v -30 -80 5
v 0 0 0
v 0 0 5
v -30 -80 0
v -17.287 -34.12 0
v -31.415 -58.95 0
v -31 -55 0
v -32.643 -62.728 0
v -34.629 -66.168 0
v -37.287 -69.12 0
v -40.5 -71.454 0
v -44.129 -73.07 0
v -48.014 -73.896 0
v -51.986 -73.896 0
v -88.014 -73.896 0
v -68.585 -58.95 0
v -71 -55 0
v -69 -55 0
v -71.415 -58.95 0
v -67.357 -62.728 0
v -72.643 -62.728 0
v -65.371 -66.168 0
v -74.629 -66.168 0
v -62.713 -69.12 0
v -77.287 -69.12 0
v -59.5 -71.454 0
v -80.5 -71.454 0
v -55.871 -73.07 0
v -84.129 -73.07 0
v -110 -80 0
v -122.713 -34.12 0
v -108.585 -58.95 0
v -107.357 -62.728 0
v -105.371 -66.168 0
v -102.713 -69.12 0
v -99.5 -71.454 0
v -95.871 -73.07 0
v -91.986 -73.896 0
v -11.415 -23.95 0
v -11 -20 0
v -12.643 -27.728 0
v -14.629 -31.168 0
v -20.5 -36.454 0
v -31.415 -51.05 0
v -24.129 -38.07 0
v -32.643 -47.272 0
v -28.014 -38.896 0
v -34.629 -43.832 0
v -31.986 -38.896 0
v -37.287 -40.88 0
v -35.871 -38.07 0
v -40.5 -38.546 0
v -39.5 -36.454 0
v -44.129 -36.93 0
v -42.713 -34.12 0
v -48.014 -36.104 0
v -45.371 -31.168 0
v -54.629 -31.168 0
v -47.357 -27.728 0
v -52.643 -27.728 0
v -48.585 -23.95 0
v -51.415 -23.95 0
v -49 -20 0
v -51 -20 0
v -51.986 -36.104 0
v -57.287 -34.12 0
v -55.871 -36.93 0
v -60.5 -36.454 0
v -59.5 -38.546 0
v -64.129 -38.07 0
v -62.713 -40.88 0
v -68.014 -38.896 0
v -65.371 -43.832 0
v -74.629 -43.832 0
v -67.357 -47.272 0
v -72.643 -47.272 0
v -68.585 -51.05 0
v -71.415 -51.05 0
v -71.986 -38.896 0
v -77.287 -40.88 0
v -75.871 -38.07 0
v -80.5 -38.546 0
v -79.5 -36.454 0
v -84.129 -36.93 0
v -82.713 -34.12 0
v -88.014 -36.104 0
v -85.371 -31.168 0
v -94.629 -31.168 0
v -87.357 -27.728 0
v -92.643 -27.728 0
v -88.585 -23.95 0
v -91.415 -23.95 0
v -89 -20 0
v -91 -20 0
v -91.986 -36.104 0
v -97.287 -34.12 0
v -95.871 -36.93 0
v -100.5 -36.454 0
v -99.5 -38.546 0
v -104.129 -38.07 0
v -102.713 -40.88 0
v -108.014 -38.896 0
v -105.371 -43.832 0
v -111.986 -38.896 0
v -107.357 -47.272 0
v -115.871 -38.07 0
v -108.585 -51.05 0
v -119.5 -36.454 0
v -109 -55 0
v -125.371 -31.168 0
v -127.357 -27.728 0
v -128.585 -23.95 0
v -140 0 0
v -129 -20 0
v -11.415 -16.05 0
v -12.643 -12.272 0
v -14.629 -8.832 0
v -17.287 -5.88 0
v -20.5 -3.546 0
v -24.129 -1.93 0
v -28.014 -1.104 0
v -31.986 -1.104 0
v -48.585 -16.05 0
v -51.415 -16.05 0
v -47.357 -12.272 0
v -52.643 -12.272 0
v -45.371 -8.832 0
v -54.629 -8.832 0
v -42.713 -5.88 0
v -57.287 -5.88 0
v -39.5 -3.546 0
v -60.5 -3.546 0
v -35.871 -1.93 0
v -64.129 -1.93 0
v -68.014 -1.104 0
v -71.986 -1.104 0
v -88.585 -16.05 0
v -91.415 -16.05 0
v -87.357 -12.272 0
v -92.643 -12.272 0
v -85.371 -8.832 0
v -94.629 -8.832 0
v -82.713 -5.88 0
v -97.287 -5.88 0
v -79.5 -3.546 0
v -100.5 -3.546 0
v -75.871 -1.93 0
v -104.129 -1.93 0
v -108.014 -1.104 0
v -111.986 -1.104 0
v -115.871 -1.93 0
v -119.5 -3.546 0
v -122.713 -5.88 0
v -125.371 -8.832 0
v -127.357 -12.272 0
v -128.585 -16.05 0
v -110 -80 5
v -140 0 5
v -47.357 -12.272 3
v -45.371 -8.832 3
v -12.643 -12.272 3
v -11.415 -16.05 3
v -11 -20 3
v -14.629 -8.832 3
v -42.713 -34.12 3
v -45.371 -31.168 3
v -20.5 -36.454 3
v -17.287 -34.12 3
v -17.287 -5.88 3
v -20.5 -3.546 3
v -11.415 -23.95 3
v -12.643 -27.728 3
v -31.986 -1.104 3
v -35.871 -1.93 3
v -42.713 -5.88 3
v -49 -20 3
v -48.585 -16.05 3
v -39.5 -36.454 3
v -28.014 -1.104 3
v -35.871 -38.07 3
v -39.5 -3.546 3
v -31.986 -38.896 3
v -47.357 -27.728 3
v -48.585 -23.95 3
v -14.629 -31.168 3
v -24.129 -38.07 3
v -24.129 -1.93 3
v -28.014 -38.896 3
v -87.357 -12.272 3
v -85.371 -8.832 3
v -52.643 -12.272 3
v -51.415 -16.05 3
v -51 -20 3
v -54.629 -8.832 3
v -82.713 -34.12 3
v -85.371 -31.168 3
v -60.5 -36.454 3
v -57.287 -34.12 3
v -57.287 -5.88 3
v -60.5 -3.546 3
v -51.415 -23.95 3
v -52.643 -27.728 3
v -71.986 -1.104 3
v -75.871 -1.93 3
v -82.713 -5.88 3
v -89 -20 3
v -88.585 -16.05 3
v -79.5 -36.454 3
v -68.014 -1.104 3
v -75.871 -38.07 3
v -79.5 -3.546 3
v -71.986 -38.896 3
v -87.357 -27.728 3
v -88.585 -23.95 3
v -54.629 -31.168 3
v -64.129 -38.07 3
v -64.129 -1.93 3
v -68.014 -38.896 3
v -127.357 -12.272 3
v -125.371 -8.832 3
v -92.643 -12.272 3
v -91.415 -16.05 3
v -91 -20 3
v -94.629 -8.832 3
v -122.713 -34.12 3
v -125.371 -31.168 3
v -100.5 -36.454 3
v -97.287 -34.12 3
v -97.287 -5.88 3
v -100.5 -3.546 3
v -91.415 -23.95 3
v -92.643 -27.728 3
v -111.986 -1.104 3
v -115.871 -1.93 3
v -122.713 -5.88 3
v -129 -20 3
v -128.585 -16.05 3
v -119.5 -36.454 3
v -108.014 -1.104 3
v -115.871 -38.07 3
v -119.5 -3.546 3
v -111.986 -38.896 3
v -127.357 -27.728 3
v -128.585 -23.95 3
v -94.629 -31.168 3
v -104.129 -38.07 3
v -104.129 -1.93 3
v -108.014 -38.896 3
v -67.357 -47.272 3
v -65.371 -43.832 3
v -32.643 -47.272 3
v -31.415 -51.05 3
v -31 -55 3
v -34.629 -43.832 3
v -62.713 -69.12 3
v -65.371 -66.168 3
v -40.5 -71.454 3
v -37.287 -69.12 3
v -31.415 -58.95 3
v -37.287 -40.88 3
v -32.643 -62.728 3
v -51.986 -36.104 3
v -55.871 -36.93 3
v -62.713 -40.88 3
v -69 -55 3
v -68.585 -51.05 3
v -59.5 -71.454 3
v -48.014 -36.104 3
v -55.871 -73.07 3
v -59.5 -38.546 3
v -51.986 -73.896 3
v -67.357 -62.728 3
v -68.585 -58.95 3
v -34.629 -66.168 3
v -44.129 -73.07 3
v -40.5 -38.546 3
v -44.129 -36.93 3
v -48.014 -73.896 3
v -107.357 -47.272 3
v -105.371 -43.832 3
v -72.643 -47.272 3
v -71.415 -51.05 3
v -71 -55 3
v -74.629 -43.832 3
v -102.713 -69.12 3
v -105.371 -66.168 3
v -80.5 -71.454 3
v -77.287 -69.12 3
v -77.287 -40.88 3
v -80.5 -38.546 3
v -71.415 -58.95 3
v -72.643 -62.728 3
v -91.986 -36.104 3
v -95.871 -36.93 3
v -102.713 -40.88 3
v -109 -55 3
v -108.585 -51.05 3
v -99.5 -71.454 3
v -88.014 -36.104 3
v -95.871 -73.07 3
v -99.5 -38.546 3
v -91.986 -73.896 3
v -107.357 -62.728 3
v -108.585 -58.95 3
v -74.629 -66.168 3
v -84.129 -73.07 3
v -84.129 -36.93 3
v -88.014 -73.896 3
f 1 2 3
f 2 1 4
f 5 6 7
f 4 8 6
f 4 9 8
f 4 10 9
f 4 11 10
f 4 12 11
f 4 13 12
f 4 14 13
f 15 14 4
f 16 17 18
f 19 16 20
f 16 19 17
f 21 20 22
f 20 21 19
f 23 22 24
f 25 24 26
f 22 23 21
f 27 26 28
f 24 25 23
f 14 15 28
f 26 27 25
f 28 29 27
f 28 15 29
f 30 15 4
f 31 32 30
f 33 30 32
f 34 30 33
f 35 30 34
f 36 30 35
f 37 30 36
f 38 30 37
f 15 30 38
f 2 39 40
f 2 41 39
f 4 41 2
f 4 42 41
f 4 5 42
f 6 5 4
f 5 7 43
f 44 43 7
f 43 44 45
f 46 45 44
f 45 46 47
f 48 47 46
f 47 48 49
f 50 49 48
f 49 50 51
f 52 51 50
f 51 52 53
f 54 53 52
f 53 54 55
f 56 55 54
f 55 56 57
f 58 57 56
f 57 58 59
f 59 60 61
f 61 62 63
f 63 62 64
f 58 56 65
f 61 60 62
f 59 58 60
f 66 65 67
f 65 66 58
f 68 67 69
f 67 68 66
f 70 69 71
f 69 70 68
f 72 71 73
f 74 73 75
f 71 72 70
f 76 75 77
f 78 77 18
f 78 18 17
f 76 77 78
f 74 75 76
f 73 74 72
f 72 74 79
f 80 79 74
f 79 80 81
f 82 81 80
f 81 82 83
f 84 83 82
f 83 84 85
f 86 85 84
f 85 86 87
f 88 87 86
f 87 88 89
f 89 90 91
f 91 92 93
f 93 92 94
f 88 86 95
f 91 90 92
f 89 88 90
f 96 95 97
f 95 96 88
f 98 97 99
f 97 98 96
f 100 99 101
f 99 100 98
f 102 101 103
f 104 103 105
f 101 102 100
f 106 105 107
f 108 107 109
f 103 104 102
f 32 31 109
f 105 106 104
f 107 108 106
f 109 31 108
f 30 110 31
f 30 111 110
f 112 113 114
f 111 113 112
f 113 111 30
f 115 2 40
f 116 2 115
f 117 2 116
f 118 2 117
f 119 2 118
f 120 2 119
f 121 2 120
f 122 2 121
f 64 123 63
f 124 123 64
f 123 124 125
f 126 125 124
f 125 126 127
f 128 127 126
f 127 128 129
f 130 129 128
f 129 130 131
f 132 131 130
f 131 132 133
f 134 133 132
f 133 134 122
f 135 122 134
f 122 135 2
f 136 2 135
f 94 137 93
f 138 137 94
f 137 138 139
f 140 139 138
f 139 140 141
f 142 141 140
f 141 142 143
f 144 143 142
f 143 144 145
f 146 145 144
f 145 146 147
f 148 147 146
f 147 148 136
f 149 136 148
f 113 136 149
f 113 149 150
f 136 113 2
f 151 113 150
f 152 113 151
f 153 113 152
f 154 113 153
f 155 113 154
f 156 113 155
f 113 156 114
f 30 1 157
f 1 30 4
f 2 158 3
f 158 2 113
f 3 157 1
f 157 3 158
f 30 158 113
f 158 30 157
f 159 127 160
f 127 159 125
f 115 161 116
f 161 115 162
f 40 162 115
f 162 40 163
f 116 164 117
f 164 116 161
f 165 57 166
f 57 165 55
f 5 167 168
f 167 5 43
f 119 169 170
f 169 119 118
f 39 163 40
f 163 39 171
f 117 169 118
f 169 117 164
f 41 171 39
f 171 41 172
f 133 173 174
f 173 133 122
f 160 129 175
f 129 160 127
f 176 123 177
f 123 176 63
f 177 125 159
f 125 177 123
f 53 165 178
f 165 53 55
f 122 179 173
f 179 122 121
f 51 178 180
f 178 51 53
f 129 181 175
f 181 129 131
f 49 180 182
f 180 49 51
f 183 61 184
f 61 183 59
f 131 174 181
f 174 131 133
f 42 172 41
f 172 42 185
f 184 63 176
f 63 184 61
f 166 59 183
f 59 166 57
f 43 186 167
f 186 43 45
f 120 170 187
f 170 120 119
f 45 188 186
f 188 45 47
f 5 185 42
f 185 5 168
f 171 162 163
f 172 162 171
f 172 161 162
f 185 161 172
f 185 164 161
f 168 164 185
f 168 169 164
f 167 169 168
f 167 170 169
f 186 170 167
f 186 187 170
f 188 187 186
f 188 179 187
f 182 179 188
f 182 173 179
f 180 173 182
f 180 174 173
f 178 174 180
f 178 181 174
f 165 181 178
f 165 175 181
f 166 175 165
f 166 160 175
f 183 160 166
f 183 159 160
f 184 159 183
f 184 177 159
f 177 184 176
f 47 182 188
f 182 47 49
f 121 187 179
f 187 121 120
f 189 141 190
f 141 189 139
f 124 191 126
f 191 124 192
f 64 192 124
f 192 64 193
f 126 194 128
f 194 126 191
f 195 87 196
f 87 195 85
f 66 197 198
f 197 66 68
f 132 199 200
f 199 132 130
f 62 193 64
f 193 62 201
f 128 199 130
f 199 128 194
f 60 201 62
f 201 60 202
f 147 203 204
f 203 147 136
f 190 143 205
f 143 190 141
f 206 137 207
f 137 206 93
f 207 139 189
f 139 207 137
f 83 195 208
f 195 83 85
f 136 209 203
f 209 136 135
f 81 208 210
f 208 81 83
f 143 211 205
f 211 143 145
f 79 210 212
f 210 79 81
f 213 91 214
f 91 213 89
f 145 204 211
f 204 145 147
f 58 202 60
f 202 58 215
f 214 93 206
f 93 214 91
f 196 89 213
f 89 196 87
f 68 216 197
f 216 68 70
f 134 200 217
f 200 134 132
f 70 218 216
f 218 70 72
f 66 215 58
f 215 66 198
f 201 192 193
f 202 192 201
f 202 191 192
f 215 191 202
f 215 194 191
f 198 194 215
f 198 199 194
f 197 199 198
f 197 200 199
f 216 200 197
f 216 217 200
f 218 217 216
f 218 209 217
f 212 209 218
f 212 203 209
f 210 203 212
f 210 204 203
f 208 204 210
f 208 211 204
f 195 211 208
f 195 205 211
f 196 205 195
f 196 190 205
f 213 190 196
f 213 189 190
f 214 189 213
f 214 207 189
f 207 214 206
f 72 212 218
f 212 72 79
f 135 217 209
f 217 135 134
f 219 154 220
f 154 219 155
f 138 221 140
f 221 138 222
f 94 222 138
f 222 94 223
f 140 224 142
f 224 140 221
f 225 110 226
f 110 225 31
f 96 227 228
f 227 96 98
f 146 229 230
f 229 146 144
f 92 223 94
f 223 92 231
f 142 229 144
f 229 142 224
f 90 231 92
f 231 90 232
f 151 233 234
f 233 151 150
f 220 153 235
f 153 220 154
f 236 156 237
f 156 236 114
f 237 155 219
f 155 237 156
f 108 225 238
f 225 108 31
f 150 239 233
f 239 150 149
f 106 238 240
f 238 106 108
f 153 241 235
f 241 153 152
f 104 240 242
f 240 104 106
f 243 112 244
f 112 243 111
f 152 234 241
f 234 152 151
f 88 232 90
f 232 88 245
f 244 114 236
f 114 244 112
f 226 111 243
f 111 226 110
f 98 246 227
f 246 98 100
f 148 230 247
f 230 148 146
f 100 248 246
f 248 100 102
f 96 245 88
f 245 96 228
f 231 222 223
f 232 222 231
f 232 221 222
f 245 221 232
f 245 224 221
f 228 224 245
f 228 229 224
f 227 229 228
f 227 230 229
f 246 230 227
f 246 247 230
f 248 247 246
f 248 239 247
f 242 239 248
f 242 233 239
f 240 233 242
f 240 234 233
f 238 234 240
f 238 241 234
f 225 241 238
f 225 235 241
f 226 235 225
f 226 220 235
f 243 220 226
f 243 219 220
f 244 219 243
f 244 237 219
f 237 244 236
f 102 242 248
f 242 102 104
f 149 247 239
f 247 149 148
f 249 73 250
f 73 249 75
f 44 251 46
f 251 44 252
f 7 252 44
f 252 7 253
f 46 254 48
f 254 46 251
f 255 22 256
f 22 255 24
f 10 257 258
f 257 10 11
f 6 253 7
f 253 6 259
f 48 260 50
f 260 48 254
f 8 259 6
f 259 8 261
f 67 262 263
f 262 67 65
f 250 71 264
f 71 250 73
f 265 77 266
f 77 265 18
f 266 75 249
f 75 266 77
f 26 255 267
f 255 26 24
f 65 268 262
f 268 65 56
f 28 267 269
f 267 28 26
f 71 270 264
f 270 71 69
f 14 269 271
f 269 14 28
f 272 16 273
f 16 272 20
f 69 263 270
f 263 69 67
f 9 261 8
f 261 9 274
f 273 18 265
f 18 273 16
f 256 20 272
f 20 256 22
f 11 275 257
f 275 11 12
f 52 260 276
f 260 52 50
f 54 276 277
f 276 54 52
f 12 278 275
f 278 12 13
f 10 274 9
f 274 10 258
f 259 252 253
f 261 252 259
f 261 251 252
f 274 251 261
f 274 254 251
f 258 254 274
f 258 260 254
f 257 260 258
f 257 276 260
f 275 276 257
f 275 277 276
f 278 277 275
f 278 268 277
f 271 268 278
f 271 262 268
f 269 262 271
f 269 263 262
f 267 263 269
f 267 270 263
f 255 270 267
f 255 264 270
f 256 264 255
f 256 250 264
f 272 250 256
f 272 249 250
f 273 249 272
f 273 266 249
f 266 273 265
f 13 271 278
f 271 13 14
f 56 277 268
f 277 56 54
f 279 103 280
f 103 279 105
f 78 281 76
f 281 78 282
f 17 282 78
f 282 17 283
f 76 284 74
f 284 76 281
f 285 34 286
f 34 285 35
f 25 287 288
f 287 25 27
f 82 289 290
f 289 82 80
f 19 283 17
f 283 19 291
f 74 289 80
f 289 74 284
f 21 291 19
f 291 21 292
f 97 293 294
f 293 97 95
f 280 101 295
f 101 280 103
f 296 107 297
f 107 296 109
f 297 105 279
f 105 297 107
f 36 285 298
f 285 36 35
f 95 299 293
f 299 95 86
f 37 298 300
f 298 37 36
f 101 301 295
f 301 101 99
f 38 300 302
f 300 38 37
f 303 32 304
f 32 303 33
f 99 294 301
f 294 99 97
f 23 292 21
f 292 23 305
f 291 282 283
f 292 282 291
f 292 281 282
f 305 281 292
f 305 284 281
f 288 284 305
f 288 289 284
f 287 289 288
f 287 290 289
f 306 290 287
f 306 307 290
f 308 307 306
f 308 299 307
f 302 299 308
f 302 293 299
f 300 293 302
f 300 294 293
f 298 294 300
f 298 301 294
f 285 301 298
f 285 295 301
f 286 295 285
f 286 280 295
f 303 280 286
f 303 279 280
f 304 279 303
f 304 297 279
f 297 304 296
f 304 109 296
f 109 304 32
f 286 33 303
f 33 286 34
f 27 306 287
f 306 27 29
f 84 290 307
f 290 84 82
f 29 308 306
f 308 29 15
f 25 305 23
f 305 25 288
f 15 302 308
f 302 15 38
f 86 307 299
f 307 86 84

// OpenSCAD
color("red")
    translate([0, -100, -20])
        linear_extrude(height = 4, center = true)
        cylinder(h=20, r=5, center=true);
            difference() {
                trapezoid(-140, -80, -80,5);
                translate([-30, -20, -1]) cylinder(h=4, r=19);
                translate([-70, -20, -1]) cylinder(h=4, r=19);
                translate([-110, -20, -1]) cylinder(h=4, r=19);
                translate([-50, -55, -1]) cylinder(h=4, r=19);
                translate([-90, -55, -1]) cylinder(h=4, r=19);
            }
      
module trapezoid(width_base, width_top,height,thickness) {

  linear_extrude(height = thickness) polygon(points=[[0,0],[width_base,0],[width_base-(width_base-width_top)/2,height],[(width_base-width_top)/2,height]], paths=[[0,1,2,3]]); 
  
}
